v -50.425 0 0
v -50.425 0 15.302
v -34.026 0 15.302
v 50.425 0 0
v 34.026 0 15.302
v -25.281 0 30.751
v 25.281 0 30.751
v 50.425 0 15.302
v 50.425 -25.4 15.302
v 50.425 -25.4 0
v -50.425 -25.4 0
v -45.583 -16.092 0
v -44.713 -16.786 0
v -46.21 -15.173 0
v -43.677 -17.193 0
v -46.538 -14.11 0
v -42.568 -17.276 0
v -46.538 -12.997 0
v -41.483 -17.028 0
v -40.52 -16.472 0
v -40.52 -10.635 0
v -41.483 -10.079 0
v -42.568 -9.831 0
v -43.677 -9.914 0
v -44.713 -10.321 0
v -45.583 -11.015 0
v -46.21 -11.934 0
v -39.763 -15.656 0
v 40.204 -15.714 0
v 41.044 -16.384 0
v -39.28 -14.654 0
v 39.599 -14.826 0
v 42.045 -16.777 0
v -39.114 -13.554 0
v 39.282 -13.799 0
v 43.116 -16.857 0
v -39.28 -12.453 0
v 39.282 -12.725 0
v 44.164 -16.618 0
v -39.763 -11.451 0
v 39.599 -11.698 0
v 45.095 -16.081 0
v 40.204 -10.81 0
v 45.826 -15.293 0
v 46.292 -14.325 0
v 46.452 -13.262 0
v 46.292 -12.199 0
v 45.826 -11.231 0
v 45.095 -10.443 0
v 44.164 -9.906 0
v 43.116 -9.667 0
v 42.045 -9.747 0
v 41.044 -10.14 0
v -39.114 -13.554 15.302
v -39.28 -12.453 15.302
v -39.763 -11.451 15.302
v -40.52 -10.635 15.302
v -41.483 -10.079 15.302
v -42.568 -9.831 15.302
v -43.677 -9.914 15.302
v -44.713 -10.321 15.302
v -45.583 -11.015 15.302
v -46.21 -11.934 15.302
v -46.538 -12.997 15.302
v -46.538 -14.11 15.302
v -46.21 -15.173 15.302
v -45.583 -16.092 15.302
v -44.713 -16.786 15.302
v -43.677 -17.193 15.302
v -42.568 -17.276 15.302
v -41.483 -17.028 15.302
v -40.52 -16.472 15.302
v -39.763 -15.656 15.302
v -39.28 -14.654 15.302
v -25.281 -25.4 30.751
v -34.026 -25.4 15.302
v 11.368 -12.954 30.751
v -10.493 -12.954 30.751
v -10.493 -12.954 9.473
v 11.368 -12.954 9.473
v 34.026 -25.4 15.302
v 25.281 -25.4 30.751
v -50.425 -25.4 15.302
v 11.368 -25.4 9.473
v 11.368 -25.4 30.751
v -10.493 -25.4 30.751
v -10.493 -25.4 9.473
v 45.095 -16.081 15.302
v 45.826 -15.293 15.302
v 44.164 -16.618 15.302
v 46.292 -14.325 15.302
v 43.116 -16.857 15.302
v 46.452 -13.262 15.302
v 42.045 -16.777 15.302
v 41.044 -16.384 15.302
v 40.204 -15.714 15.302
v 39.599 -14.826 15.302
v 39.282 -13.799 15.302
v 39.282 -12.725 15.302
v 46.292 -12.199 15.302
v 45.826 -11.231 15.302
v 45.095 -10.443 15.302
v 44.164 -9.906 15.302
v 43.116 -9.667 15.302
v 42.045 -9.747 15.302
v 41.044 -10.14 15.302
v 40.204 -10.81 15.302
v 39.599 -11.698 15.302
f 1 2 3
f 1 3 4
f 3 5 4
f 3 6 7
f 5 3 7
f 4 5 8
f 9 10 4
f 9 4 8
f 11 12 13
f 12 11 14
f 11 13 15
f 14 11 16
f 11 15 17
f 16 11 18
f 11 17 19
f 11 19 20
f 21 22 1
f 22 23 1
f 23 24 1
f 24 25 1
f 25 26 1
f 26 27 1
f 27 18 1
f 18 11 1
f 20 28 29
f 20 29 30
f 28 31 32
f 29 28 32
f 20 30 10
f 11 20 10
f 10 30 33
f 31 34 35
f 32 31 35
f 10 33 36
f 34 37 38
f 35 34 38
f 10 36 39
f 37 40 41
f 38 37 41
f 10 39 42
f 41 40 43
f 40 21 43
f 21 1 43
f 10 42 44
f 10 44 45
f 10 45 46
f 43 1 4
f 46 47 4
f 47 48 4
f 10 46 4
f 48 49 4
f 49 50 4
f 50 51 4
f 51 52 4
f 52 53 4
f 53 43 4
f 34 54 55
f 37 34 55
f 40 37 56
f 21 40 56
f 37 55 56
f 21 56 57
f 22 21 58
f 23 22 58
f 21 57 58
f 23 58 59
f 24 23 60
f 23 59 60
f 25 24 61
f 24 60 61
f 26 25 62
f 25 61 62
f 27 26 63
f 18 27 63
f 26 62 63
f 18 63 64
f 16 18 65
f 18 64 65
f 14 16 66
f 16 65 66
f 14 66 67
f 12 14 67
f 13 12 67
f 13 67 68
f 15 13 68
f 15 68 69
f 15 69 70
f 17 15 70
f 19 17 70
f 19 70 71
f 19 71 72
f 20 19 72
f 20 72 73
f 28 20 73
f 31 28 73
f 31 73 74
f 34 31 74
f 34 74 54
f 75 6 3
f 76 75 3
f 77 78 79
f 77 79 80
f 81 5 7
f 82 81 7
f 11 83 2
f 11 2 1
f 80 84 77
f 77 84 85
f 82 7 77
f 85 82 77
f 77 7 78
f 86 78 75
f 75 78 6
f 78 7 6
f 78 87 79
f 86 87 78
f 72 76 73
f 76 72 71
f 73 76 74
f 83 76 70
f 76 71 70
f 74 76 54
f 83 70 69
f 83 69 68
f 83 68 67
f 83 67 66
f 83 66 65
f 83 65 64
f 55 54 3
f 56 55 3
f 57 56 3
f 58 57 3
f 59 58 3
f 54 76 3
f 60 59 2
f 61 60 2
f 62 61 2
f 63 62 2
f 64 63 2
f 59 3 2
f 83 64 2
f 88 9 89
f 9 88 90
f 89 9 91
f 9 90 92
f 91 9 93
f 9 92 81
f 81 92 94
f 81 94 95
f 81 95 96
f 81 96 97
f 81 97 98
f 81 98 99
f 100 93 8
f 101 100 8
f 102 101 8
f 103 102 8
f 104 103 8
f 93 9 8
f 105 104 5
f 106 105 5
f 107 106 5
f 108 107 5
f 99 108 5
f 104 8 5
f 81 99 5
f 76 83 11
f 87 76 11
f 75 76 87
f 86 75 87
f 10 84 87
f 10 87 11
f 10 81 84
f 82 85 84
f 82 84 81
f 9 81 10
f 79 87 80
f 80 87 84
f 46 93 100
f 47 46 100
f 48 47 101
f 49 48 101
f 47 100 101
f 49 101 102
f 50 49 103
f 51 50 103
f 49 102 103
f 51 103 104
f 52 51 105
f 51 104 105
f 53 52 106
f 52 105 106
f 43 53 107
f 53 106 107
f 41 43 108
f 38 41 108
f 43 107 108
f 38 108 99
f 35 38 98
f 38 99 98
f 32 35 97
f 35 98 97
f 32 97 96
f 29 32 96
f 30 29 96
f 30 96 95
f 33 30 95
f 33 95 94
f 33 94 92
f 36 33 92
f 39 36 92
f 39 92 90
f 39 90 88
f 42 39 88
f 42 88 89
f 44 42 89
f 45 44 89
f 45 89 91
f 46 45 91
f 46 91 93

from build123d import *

# Parameters (mm, degrees)
F1_DEPTH = 25.4
F2_W     = 21.8606553972
F2_H     = 22.4436074495
F3_DEPTH = 12.446
F4_R     = 3.7327062706
F4_R_2   = 3.6053518758
F5_DEPTH = 25.4


# Not quite as in the source:
# - ends of sketch curves that miss each other by under 0.0002 mm in the source are joined


with BuildPart() as f1:
    # F0 (on Front) → F1 (new body)
    with BuildSketch(Plane.XZ):
        Polygon((25.2813665716, 30.7506565005), (-8.463e-07, 30.7506565005), (-8.463e-07, 0), (50.4252426326, 0), (50.4252426326, 15.3024597093), (34.0256324557, 15.3024597093), align=None)
        Polygon((-8.463e-07, 0), (-8.463e-07, 30.7506565005), (-25.2813665716, 30.7506565005), (-34.0256324557, 15.3024597093), (-50.4252426326, 15.3024597093), (-50.4252426326, 0), align=None)
    extrude(amount=F1_DEPTH)

    # F2 (on face) → F3 (cut)
    with BuildSketch(Plane.XZ.offset(25.4)):
        with Locations((0.4372131079, 20.6947550178)):
            Rectangle(F2_W, F2_H)
    extrude(amount=-F3_DEPTH, mode=Mode.SUBTRACT)

    # F4 (on face) → F5 (cut)
    with BuildSketch(Plane.XY.offset(15.3024597093)):
        with Locations((-42.8468845785, -13.5536063462)):
            Circle(F4_R)
        with Locations((42.8468845785, -13.2621303201)):
            Circle(F4_R_2)
    extrude(amount=-F5_DEPTH, mode=Mode.SUBTRACT)


solid = f1.part
